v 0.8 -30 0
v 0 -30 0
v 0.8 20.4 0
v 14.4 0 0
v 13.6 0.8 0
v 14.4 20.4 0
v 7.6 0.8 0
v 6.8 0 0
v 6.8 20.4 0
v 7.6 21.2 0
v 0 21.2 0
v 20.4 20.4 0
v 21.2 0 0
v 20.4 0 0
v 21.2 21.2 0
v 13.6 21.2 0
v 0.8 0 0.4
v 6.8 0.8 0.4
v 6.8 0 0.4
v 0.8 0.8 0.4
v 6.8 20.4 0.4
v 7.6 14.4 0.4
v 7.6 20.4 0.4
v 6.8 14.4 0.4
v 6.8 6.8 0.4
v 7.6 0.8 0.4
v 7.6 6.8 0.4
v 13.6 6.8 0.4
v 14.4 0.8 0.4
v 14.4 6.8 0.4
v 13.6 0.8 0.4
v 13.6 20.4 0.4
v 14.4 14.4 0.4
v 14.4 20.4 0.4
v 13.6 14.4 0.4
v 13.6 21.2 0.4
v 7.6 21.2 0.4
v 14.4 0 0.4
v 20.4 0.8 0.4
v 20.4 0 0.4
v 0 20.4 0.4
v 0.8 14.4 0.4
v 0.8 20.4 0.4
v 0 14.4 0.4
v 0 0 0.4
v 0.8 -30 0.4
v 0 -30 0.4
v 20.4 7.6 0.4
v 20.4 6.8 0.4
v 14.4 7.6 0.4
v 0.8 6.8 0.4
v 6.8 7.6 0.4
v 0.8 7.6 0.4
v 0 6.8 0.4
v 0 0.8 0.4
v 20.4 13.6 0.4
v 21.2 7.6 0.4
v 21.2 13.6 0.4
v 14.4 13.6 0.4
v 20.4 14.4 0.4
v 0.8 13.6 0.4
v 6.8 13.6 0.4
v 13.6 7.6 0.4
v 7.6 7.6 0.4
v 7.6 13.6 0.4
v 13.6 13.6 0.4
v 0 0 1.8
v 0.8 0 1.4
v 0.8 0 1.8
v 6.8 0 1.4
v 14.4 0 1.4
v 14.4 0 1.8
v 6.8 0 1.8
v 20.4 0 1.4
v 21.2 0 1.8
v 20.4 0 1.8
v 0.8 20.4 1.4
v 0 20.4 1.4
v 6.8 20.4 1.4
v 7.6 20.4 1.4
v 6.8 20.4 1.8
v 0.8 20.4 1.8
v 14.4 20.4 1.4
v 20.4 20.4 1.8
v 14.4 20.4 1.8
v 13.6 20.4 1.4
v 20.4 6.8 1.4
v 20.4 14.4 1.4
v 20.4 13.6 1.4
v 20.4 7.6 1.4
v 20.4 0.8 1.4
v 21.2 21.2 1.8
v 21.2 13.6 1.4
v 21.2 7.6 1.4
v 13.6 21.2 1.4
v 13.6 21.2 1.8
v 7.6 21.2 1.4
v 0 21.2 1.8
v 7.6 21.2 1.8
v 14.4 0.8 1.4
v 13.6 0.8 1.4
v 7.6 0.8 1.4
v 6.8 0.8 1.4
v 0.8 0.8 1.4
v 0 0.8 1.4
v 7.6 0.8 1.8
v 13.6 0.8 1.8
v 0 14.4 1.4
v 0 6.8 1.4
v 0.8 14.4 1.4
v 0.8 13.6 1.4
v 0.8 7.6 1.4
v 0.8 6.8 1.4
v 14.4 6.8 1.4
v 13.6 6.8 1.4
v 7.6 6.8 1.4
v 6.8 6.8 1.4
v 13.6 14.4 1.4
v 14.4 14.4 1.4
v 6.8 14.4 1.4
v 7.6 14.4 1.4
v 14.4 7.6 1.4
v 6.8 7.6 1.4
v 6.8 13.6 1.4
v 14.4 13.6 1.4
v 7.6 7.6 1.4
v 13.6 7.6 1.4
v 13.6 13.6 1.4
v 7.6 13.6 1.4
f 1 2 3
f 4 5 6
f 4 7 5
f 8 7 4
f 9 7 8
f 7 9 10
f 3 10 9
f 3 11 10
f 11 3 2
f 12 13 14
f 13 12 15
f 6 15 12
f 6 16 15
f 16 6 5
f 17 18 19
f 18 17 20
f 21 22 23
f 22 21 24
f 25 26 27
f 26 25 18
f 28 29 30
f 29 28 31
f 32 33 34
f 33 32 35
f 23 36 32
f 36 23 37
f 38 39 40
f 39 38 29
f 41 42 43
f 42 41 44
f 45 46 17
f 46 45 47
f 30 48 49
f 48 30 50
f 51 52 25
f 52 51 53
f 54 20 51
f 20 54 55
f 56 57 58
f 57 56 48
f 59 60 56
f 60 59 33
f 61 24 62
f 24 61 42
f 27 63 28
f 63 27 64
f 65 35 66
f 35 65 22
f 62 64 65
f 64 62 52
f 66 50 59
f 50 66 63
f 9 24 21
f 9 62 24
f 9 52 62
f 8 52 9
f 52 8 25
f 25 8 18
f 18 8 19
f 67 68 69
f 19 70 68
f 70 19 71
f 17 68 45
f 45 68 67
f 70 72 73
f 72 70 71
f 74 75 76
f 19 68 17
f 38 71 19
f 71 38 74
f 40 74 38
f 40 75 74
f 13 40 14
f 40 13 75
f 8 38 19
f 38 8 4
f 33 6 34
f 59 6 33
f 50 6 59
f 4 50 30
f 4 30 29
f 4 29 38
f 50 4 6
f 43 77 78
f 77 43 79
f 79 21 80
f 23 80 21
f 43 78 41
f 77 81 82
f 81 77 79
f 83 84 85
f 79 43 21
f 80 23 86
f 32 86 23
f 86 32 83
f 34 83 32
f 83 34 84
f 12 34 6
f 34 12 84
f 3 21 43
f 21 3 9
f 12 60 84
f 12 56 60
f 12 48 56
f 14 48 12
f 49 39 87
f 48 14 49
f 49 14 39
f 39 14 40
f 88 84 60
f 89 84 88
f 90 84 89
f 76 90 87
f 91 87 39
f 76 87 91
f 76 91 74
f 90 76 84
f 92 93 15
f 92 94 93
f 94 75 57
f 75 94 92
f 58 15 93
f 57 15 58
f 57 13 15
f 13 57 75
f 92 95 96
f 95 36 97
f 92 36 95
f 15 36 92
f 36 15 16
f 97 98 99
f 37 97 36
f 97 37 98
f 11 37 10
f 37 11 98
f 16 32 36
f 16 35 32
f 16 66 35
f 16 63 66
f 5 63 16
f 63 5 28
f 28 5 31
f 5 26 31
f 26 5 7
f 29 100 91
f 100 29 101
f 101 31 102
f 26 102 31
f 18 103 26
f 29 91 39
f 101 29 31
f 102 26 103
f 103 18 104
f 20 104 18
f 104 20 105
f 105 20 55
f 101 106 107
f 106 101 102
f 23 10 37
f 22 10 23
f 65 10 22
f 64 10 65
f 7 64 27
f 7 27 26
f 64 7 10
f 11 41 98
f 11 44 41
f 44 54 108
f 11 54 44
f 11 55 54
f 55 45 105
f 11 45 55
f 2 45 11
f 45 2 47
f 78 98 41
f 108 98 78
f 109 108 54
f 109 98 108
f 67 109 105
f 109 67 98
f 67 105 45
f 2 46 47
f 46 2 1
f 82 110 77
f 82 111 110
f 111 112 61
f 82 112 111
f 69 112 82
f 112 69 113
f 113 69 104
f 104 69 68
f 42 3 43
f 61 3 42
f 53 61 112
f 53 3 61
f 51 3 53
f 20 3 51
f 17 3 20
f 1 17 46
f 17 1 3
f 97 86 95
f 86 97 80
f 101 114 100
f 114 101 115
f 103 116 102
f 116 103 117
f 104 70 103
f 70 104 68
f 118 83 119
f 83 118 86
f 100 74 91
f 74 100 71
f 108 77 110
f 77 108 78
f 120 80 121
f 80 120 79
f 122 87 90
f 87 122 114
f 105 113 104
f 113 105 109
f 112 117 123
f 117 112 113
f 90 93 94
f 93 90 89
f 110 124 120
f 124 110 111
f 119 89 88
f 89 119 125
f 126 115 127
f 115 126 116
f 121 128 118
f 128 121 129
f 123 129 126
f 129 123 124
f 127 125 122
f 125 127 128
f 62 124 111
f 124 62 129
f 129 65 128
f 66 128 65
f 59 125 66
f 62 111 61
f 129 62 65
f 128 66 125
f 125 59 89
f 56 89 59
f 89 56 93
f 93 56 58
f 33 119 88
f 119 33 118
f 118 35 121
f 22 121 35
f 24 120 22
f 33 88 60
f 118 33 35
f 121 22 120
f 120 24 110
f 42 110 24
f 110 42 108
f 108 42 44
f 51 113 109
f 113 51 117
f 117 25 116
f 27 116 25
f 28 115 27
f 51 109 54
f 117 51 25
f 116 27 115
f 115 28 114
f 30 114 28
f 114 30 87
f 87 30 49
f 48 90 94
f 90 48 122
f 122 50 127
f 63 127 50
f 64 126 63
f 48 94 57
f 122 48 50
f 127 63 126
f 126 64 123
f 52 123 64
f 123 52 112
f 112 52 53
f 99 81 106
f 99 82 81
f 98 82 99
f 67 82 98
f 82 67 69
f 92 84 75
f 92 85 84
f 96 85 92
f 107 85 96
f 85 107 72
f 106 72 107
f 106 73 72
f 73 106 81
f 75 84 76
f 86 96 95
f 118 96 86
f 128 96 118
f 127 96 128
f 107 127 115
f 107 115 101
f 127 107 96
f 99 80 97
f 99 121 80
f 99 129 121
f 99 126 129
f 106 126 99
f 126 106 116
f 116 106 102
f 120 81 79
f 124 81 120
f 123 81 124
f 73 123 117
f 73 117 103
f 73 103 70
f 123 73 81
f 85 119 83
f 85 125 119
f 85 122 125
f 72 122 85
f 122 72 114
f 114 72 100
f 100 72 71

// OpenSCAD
// file: ../../api/v3/reporting.scad
//////////////////////////////////////////////////////////////////////
// LibFile: reporting.scad
// Project: Grid Stack
// FileGroup: API v3 Reporting
// FileSummary: Console report for immutable direct and positive-gap coupons.
// Role: Records the exact environment, dimensions, support strategy, path
//       lengths, qualification status, and deposited-layer counts.
// Requires: API v3 indexes, mathematics, and path generator.
// Exports: report_structural_coupon_object().
//////////////////////////////////////////////////////////////////////

function _bridge_status3(span, process) =
    span <= process[PX3_BRIDGE_MAX]
        ? "within_owner_tested_limit"
        : "exploratory_beyond_owner_tested_limit";

module report_structural_coupon_object(object, report_level = "full") {
    material = object[SCO_MATERIAL];
    nozzle = object[SCO_NOZZLE];
    printer = object[SCO_PRINTER];
    process = object[SCO_PROCESS];
    boundary = object[SCO_BOUNDARY];
    gap = object[SCO_CLEAR_GAP];
    strategy = object[SCO_SUPPORT_STRATEGY];

    echo("--- Grid Stack immutable structural coupon ---");
    echo(str("Object: ", object[SCO_NAME], " revision ", object[SCO_REVISION]));
    echo(str("API/schema: ", object[SCO_REQUIRED_API], "/",
        object[SCO_SCHEMA_VERSION]));
    echo(str("Release/base commit: ", object[SCO_SOURCE_RELEASE], " / ",
        object[SCO_FRAMEWORK_BASE_COMMIT]));
    echo(str("Material/nozzle/printer: ", material[MAT3_FAMILY], " / ",
        nozzle[NZ3_DIAMETER], " mm / ", printer[PRN3_NAME]));
    echo(str("Cells: ", boundary[B3_CELLS_X], " x ", boundary[B3_CELLS_Y]));
    echo(str("Clear spans: ", boundary[B3_CLEAR_SPAN_X], " x ",
        boundary[B3_CLEAR_SPAN_Y], " mm"));
    echo(str("Span status: ",
        _bridge_status3(boundary[B3_CLEAR_SPAN_X], process)));
    echo(str("Outside size: ", boundary_size_x3(boundary, process, nozzle),
        " x ", boundary_size_y3(boundary, process, nozzle), " mm"));
    echo(str("Primitive trace: ", trace_width3(nozzle), " x ",
        trace_height3(process), " mm"));
    echo(str("Structural strand: ", strand_width3(process, nozzle), " x ",
        strand_height3(process), " mm"));
    echo(str("Clear vertical gap: ", gap, " mm"));
    echo(str("Support strategy: ", strategy));
    echo(str("Total modeled height: ", coupon_total_height3(object), " mm"));

    if (report_level == "full") {
        if (strategy == "direct_orthogonal") {
            lower = coupon_path(
                boundary, process, nozzle, 0, object[SCO_LEAD_IN]
            );
            upper = coupon_path(boundary, process, nozzle, 90, 0);
            echo(str("Lower/upper path lengths: ", path_length3(lower),
                " / ", path_length3(upper), " mm"));
            echo(str("Deposited layers: ", 2 * process[PX3_HEIGHT_PASSES]));
        }
        else {
            witness = coupon_path(
                boundary, process, nozzle, 90, object[SCO_LEAD_IN]
            );
            riser = coupon_path(boundary, process, nozzle, 0, 0);
            test = coupon_path(boundary, process, nozzle, 90, 0);
            echo(str("Witness/riser/test path lengths: ",
                path_length3(witness), " / ", path_length3(riser), " / ",
                path_length3(test), " mm"));
            echo(str("Riser deposited layers: ", round(gap_layer_count3(object))));
            echo(str("Total deposited layers: ",
                2 * process[PX3_HEIGHT_PASSES] +
                round(gap_layer_count3(object))));
        }
        echo(str("Status: ", object[SCO_STATUS]));
        echo(str("Notes: ", object[SCO_NOTES]));
    }
}
// file: ../../api/v3/validation.scad
//////////////////////////////////////////////////////////////////////
// LibFile: validation.scad
// Project: Grid Stack
// FileGroup: API v3 Validation
// FileSummary: Validates immutable environment records, count boundaries,
//              support strategy, path continuity, and layer quantization.
// Role: Rejects incompatible or physically floating recipes before geometry
//       is generated.
// Requires: API v3 indexes, mathematics, and path generator.
// Exports: validate_structural_coupon_object().
//////////////////////////////////////////////////////////////////////

module _validate_path3(points, boundary, orientation, lead_in) {
    run_count = orientation == 0
        ? boundary_strand_count_y3(boundary)
        : boundary_strand_count_x3(boundary);

    assert(len(points) == expected_coupon_point_count3(run_count, lead_in),
        "API v3 coupon path has an unexpected point count.");
    assert(!path_has_zero_segment3(points),
        "API v3 coupon path contains a zero-length segment.");
    assert(path_axis_aligned3(points),
        "API v3 coupon path must remain axis-aligned.");
    assert(points[0] != points[len(points) - 1],
        "API v3 coupon path must remain open.");
}

module validate_structural_coupon_object(object) {
    assert(object[SCO_REQUIRED_API] == GRID_STACK_API_VERSION,
        "Saved coupon requires a different Grid Stack API version.");
    assert(object[SCO_SCHEMA_VERSION] == GRID_STACK_COUPON_SCHEMA_VERSION,
        "Saved coupon requires a different coupon schema version.");
    assert(GRID_STACK_RECTANGULAR_FRAMEWORK_VERSION == 2,
        "Saved coupon requires rectangular framework version 2.");

    material = object[SCO_MATERIAL];
    nozzle = object[SCO_NOZZLE];
    printer = object[SCO_PRINTER];
    process = object[SCO_PROCESS];
    boundary = object[SCO_BOUNDARY];
    gap = object[SCO_CLEAR_GAP];
    lead_in = object[SCO_LEAD_IN];
    strategy = object[SCO_SUPPORT_STRATEGY];

    assert(nozzle[NZ3_DIAMETER] > 0,
        "Saved coupon nozzle diameter must be positive.");
    assert(process[PX3_LAYER_H] > 0,
        "Saved coupon layer height must be positive.");
    assert(process[PX3_WIDTH_PASSES] >= 2,
        "Saved coupon structural width requires at least two passes.");
    assert(process[PX3_HEIGHT_PASSES] >= 2,
        "Saved coupon structural height requires at least two layers.");
    assert(process[PX3_MATERIAL] == material[MAT3_NAME],
        "Saved coupon process/material references do not match.");
    assert(process[PX3_NOZZLE] == nozzle[NZ3_NAME],
        "Saved coupon process/nozzle references do not match.");
    assert(process[PX3_PRINTER] == printer[PRN3_NAME],
        "Saved coupon process/printer references do not match.");
    assert(boundary[B3_CELLS_X] > 0 && boundary[B3_CELLS_Y] > 0,
        "Saved coupon cell counts must be positive.");
    assert(boundary[B3_CLEAR_SPAN_X] > 0 &&
           boundary[B3_CLEAR_SPAN_Y] > 0,
        "Saved coupon clear spans must be positive.");
    assert(lead_in >= 0,
        "Saved coupon lead-in cannot be negative.");
    assert(gap >= 0,
        "Saved coupon clear gap cannot be negative.");
    assert(nearly_equal3(gap_layer_count3(object), round(gap_layer_count3(object))),
        "Saved coupon clear gap must equal a whole deposited-layer count.");
    assert(
        (strategy == "direct_orthogonal" && nearly_equal3(gap, 0)) ||
        (strategy == "witness_riser_bridge" && gap > 0),
        "Saved coupon support strategy does not match its clear gap."
    );

    if (strategy == "direct_orthogonal") {
        lower = coupon_path(boundary, process, nozzle, 0, lead_in);
        upper = coupon_path(boundary, process, nozzle, 90, 0);
        _validate_path3(lower, boundary, 0, lead_in);
        _validate_path3(upper, boundary, 90, 0);
        entry = lead_in > 0 ? 1 : 0;
        assert(nearly_equal3(point_distance_2d3(lower[entry], upper[0]), 0),
            "Direct upper path must start on the lower entry crossing.");
    }
    else {
        witness = coupon_path(boundary, process, nozzle, 90, lead_in);
        riser = coupon_path(boundary, process, nozzle, 0, 0);
        test = coupon_path(boundary, process, nozzle, 90, 0);
        _validate_path3(witness, boundary, 90, lead_in);
        _validate_path3(riser, boundary, 0, 0);
        _validate_path3(test, boundary, 90, 0);
        entry = lead_in > 0 ? 1 : 0;
        assert(nearly_equal3(point_distance_2d3(witness[entry], riser[0]), 0),
            "Riser path must start on the witness entry crossing.");
        assert(nearly_equal3(point_distance_2d3(riser[0], test[0]), 0),
            "Upper test path must start on the riser entry crossing.");
        for (i = [0 : len(test) - 1])
            assert(nearly_equal3(point_distance_2d3(test[i], witness[i + entry]), 0),
                "Upper test path must align directly above the witness path.");
    }

    echo("GRID STACK API V3 COUPON VALIDATION: PASS");
}
// file: ../../api/v3/geometry.scad
//////////////////////////////////////////////////////////////////////
// LibFile: geometry.scad
// Project: Grid Stack
// FileGroup: API v3 Printable Geometry
// FileSummary: Creates square-ended structural paths, direct-contact coupons,
//              positive witness/riser/bridge coupons, and simple diagnostics.
// Role: Supplies all geometry used by immutable API v3 recipes without
//       importing mutable workbench geometry.
// Requires: API v3 mathematics and ordered axis-aligned paths.
// Exports: render_direct_coupon(), render_positive_gap_coupon(), and
//          render_coupon_path_debug().
//////////////////////////////////////////////////////////////////////

module _segment_2d3(a, b, width) {
    horizontal = nearly_equal3(a[1], b[1]);
    vertical = nearly_equal3(a[0], b[0]);

    assert(horizontal || vertical,
        "API v3 printable segments must be horizontal or vertical.");
    assert(!nearly_equal3(point_distance_2d3(a, b), 0),
        "API v3 printable segments must have nonzero length.");

    if (horizontal)
        translate([min(a[0], b[0]) - width / 2, a[1] - width / 2])
            square([abs(b[0] - a[0]) + width, width]);
    else
        translate([a[0] - width / 2, min(a[1], b[1]) - width / 2])
            square([width, abs(b[1] - a[1]) + width]);
}

module _path_2d3(points, width) {
    union()
        for (i = [0 : len(points) - 2])
            _segment_2d3(points[i], points[i + 1], width);
}

module _structural_path3(points, process, nozzle) {
    linear_extrude(height = strand_height3(process), convexity = 10)
        _path_2d3(points, strand_width3(process, nozzle));
}

module render_direct_coupon(lower, upper, process, nozzle) {
    union() {
        _structural_path3(lower, process, nozzle);
        translate([0, 0, strand_height3(process)])
            _structural_path3(upper, process, nozzle);
    }
}

module render_positive_gap_coupon(
    witness, riser, test, process, nozzle, clear_gap
) {
    union() {
        _structural_path3(witness, process, nozzle);

        translate([0, 0, strand_height3(process)])
            linear_extrude(height = clear_gap, convexity = 10)
                _path_2d3(riser, strand_width3(process, nozzle));

        translate([0, 0, strand_height3(process) + clear_gap])
            _structural_path3(test, process, nozzle);
    }
}

module _debug_path3(points, z, width) {
    translate([0, 0, z])
        linear_extrude(height = 0.04)
            _path_2d3(points, width);
}

module render_coupon_path_debug(
    lower, upper, riser, process, clear_gap = 0
) {
    width = max(0.12, trace_height3(process));
    _debug_path3(lower, 0, width);
    if (len(riser) > 0)
        _debug_path3(riser, strand_height3(process), width);
    _debug_path3(
        upper,
        strand_height3(process) + clear_gap,
        width
    );
}
// file: ../../api/v3/paths.scad
//////////////////////////////////////////////////////////////////////
// LibFile: paths.scad
// Project: Grid Stack
// FileGroup: API v3 Path Generation
// FileSummary: Generates one open rectangular serpentine centerline from a
//              count boundary for X- or Y-running structural paths.
// Role: Preserves parallel runs, square connectors, optional single lead-in,
//       and one uninterrupted ordered point list per deposited layer.
// Requires: API v3 indexes and mathematics.
// Exports: coupon_path() and expected_coupon_point_count3().
//////////////////////////////////////////////////////////////////////

function _x_rows3(row, count, x_min, x_max, y_min, pitch) =
    row >= count
        ? []
        : let(
            y = y_min + row * pitch,
            x_end = row % 2 == 0 ? x_max : x_min,
            row_end = [x_end, y],
            connector_end = [x_end, y + pitch]
        )
        concat(
            [row_end],
            row < count - 1 ? [connector_end] : [],
            _x_rows3(row + 1, count, x_min, x_max, y_min, pitch)
        );

function _y_columns3(column, count, x_min, y_min, y_max, pitch) =
    column >= count
        ? []
        : let(
            x = x_min + column * pitch,
            y_end = column % 2 == 0 ? y_max : y_min,
            column_end = [x, y_end],
            connector_end = [x + pitch, y_end]
        )
        concat(
            [column_end],
            column < count - 1 ? [connector_end] : [],
            _y_columns3(column + 1, count, x_min, y_min, y_max, pitch)
        );

function expected_coupon_point_count3(run_count, lead_in = 0) =
    2 * run_count + (lead_in > 0 ? 1 : 0);

function coupon_path(
    boundary, process, nozzle, orientation = 0, lead_in = 0
) =
    assert(orientation == 0 || orientation == 90,
        "API v3 coupon orientation must be 0 or 90 degrees.")
    assert(lead_in >= 0,
        "API v3 coupon lead-in cannot be negative.")
    let(
        width = strand_width3(process, nozzle),
        x_min = width / 2,
        y_min = width / 2,
        x_max = boundary_size_x3(boundary, process, nozzle) - width / 2,
        y_max = boundary_size_y3(boundary, process, nozzle) - width / 2,
        entry = [x_min, y_min],
        prefix = lead_in > 0
            ? (orientation == 0
                ? [[x_min - lead_in, y_min], entry]
                : [[x_min, y_min - lead_in], entry])
            : [entry]
    )
    orientation == 0
        ? concat(
            prefix,
            _x_rows3(
                0, boundary_strand_count_y3(boundary),
                x_min, x_max, y_min,
                boundary_pitch_y3(boundary, process, nozzle)
            )
        )
        : concat(
            prefix,
            _y_columns3(
                0, boundary_strand_count_x3(boundary),
                x_min, y_min, y_max,
                boundary_pitch_x3(boundary, process, nozzle)
            )
        );
// file: ../../api/v3/math.scad
//////////////////////////////////////////////////////////////////////
// LibFile: math.scad
// Project: Grid Stack
// FileGroup: API v3 Mathematics
// FileSummary: Pure trace, strand, boundary, path, and layer-count helpers.
// Role: Keeps API v3 calculations isolated and reproducible without importing
//       mutable workbench mathematics.
// Requires: API v3 indexes.
// Exports: nearly_equal3(), trace/strand dimensions, boundary dimensions,
//          path inspection, gap-layer count, and total-height helpers.
//////////////////////////////////////////////////////////////////////

function nearly_equal3(a, b, epsilon = 0.000001) = abs(a - b) <= epsilon;

function trace_width3(nozzle) = nozzle[NZ3_DIAMETER];
function trace_height3(process) = process[PX3_LAYER_H];
function strand_width3(process, nozzle) =
    trace_width3(nozzle) * process[PX3_WIDTH_PASSES];
function strand_height3(process) =
    trace_height3(process) * process[PX3_HEIGHT_PASSES];

function boundary_strand_count_x3(boundary) = boundary[B3_CELLS_X] + 1;
function boundary_strand_count_y3(boundary) = boundary[B3_CELLS_Y] + 1;
function boundary_pitch_x3(boundary, process, nozzle) =
    boundary[B3_CLEAR_SPAN_X] + strand_width3(process, nozzle);
function boundary_pitch_y3(boundary, process, nozzle) =
    boundary[B3_CLEAR_SPAN_Y] + strand_width3(process, nozzle);
function boundary_size_x3(boundary, process, nozzle) =
    boundary[B3_CELLS_X] * boundary[B3_CLEAR_SPAN_X] +
    boundary_strand_count_x3(boundary) * strand_width3(process, nozzle);
function boundary_size_y3(boundary, process, nozzle) =
    boundary[B3_CELLS_Y] * boundary[B3_CLEAR_SPAN_Y] +
    boundary_strand_count_y3(boundary) * strand_width3(process, nozzle);

function point_distance_2d3(a, b) =
    sqrt(pow(b[0] - a[0], 2) + pow(b[1] - a[1], 2));
function path_length3(points, i = 0) =
    i >= len(points) - 1
        ? 0
        : point_distance_2d3(points[i], points[i + 1]) +
          path_length3(points, i + 1);
function path_has_zero_segment3(points, i = 0) =
    i >= len(points) - 1
        ? false
        : nearly_equal3(point_distance_2d3(points[i], points[i + 1]), 0)
            ? true
            : path_has_zero_segment3(points, i + 1);
function segment_axis_aligned3(a, b) =
    nearly_equal3(a[0], b[0]) || nearly_equal3(a[1], b[1]);
function path_axis_aligned3(points, i = 0) =
    i >= len(points) - 1
        ? true
        : segment_axis_aligned3(points[i], points[i + 1]) &&
          path_axis_aligned3(points, i + 1);

function gap_layer_count3(object) =
    object[SCO_CLEAR_GAP] / trace_height3(object[SCO_PROCESS]);
function coupon_total_height3(object) =
    2 * strand_height3(object[SCO_PROCESS]) + object[SCO_CLEAR_GAP];
// file: ../../api/v3/schema.scad
//////////////////////////////////////////////////////////////////////
// LibFile: schema.scad
// Project: Grid Stack
// FileGroup: API v3 Data Model
// FileSummary: Constructors for self-contained immutable structural coupons.
// Role: Makes every geometry-affecting environment and object value explicit
//       inside the saved recipe rather than resolving mutable catalog names.
// Exports: material_spec(), nozzle_spec(), printer_spec(),
//          structural_process_profile(), count_boundary(), and
//          structural_coupon_object().
//////////////////////////////////////////////////////////////////////

function material_spec(
    name, family, flexibility, status = "in_use", notes = ""
) = [name, family, flexibility, status, notes];

function nozzle_spec(
    name, diameter, construction = "brass", status = "in_use", notes = ""
) = [name, diameter, construction, status, notes];

function printer_spec(
    name,
    manufacturer = "",
    model = "",
    motion_system = "",
    build_surface = "",
    status = "unrecorded",
    notes = ""
) = [
    name, manufacturer, model, motion_system,
    build_surface, status, notes
];

function structural_process_profile(
    name,
    material_name,
    nozzle_name,
    printer_name,
    layer_height,
    width_passes,
    height_passes,
    bridge_max,
    qualification,
    revision,
    notes = ""
) = [
    name, material_name, nozzle_name, printer_name,
    layer_height, width_passes, height_passes, bridge_max,
    qualification, revision, notes
];

// Function: count_boundary()
// Synopsis: Stores clear-opening counts and clear spans for one rectangle.
function count_boundary(
    name,
    cells_x,
    cells_y,
    clear_span_x,
    clear_span_y,
    notes = ""
) = [name, cells_x, cells_y, clear_span_x, clear_span_y, notes];

// Function: structural_coupon_object()
// Synopsis: Constructs one permanent coupon recipe.
// Description:
//   framework_base_commit records the last accepted repository state used to
//   begin the API implementation. The Git commit containing this recipe is the
//   authoritative complete source; a file cannot embed its own future hash.
function structural_coupon_object(
    name,
    revision,
    required_api_version,
    coupon_schema_version,
    source_release,
    framework_base_commit,
    material,
    nozzle,
    printer,
    process,
    boundary,
    clear_vertical_gap,
    lead_in,
    support_strategy,
    status = "calibration",
    notes = ""
) = [
    name,
    revision,
    required_api_version,
    coupon_schema_version,
    source_release,
    framework_base_commit,
    material,
    nozzle,
    printer,
    process,
    boundary,
    clear_vertical_gap,
    lead_in,
    support_strategy,
    status,
    notes
];
// file: ../../api/v3/indices.scad
//////////////////////////////////////////////////////////////////////
// LibFile: indices.scad
// Project: Grid Stack
// FileGroup: API v3 Data Model
// FileSummary: Named indexes for immutable structural-coupon records.
// Role: Prevents unexplained numeric indexes from entering saved recipes and
//       keeps API version 3 independent of mutable workbench indexes.
// Exports: MAT3_*, NZ3_*, PRN3_*, PX3_*, B3_*, and SCO_* constants.
//////////////////////////////////////////////////////////////////////

MAT3_NAME = 0;
MAT3_FAMILY = 1;
MAT3_FLEXIBILITY = 2;
MAT3_STATUS = 3;
MAT3_NOTES = 4;

NZ3_NAME = 0;
NZ3_DIAMETER = 1;
NZ3_CONSTRUCTION = 2;
NZ3_STATUS = 3;
NZ3_NOTES = 4;

PRN3_NAME = 0;
PRN3_MANUFACTURER = 1;
PRN3_MODEL = 2;
PRN3_MOTION_SYSTEM = 3;
PRN3_BUILD_SURFACE = 4;
PRN3_STATUS = 5;
PRN3_NOTES = 6;

PX3_NAME = 0;
PX3_MATERIAL = 1;
PX3_NOZZLE = 2;
PX3_PRINTER = 3;
PX3_LAYER_H = 4;
PX3_WIDTH_PASSES = 5;
PX3_HEIGHT_PASSES = 6;
PX3_BRIDGE_MAX = 7;
PX3_QUALIFICATION = 8;
PX3_REVISION = 9;
PX3_NOTES = 10;

B3_NAME = 0;
B3_CELLS_X = 1;
B3_CELLS_Y = 2;
B3_CLEAR_SPAN_X = 3;
B3_CLEAR_SPAN_Y = 4;
B3_NOTES = 5;

SCO_NAME = 0;
SCO_REVISION = 1;
SCO_REQUIRED_API = 2;
SCO_SCHEMA_VERSION = 3;
SCO_SOURCE_RELEASE = 4;
SCO_FRAMEWORK_BASE_COMMIT = 5;
SCO_MATERIAL = 6;
SCO_NOZZLE = 7;
SCO_PRINTER = 8;
SCO_PROCESS = 9;
SCO_BOUNDARY = 10;
SCO_CLEAR_GAP = 11;
SCO_LEAD_IN = 12;
SCO_SUPPORT_STRATEGY = 13;
SCO_STATUS = 14;
SCO_NOTES = 15;
// file: ../../api/grid_stack_v3.scad
//////////////////////////////////////////////////////////////////////
// LibFile: grid_stack_v3.scad
// Project: Grid Stack
// FileGroup: Versioned Public Interface
// FileSummary: Immutable API version 3 for rectangular count-boundary
//              structural coupons, including positive witness/riser gaps.
// Role: Reconstructs saved coupon recipes without Customizer state or mutable
//       workbench catalogs. Incompatible behavior requires a new API file.
// Exports: API/schema constants, record constructors, validation, reporting,
//          and structural_coupon_render().
//////////////////////////////////////////////////////////////////////

GRID_STACK_API_VERSION = 3;
GRID_STACK_COUPON_SCHEMA_VERSION = 1;
GRID_STACK_RECTANGULAR_FRAMEWORK_VERSION = 2;
GRID_STACK_RELEASE = "1.0.0";

include <v3/indices.scad>
include <v3/schema.scad>
include <v3/math.scad>
include <v3/paths.scad>
include <v3/geometry.scad>
include <v3/validation.scad>
include <v3/reporting.scad>

// Module: structural_coupon_render()
// Synopsis: Validates, reports, and renders one immutable coupon recipe.
// Arguments:
//   object = Record returned by structural_coupon_object().
//   mode = print, path_debug, or report_only.
//   report_level = summary or full.
module structural_coupon_render(
    object,
    mode = "print",
    report_level = "full"
) {
    validate_structural_coupon_object(object);
    report_structural_coupon_object(object, report_level);

    boundary = object[SCO_BOUNDARY];
    process = object[SCO_PROCESS];
    nozzle = object[SCO_NOZZLE];
    lead_in = object[SCO_LEAD_IN];
    clear_gap = object[SCO_CLEAR_GAP];
    strategy = object[SCO_SUPPORT_STRATEGY];

    if (strategy == "direct_orthogonal") {
        lower = coupon_path(boundary, process, nozzle, 0, lead_in);
        upper = coupon_path(boundary, process, nozzle, 90, 0);

        if (mode == "print")
            render_direct_coupon(lower, upper, process, nozzle);
        else if (mode == "path_debug")
            render_coupon_path_debug(lower, upper, [], process);
        else if (mode == "report_only")
            echo("Grid Stack API v3 report-only mode: no geometry generated.");
        else
            assert(false, str("Unknown API v3 render mode: ", mode));
    }
    else if (strategy == "witness_riser_bridge") {
        witness = coupon_path(boundary, process, nozzle, 90, lead_in);
        riser = coupon_path(boundary, process, nozzle, 0, 0);
        test = coupon_path(boundary, process, nozzle, 90, 0);

        if (mode == "print")
            render_positive_gap_coupon(
                witness, riser, test, process, nozzle, clear_gap
            );
        else if (mode == "path_debug")
            render_coupon_path_debug(witness, test, riser, process, clear_gap);
        else if (mode == "report_only")
            echo("Grid Stack API v3 report-only mode: no geometry generated.");
        else
            assert(false, str("Unknown API v3 render mode: ", mode));
    }
    else
        assert(false, str("Unknown coupon support strategy: ", strategy));
}
// main file
//////////////////////////////////////////////////////////////////////
// LibFile: coupon-3x3-span6-gap1-pla-plus-0p4-v1.scad
// Project: Grid Stack
// FileGroup: Immutable Structural Coupon
// FileSummary: 3 x 3 PLA+ coupon with 6 mm clear XY spans and 1 mm
//              clear vertical gap using witness_riser_bridge geometry.
// Role: Permanently reconstructs one calibration object without Customizer
//       state or mutable workbench catalog lookup.
// FrameworkBaseCommit: 4b5e564
// Requires: Grid Stack API version 3 and coupon schema version 1.
// Output: Printable continuous-path structural coupon geometry.
//////////////////////////////////////////////////////////////////////

include <../../api/grid_stack_v3.scad>

assert(GRID_STACK_API_VERSION == 3,
    "This recipe requires Grid Stack API version 3.");
assert(GRID_STACK_COUPON_SCHEMA_VERSION == 1,
    "This recipe requires coupon schema version 1.");
assert(GRID_STACK_RECTANGULAR_FRAMEWORK_VERSION == 2,
    "This recipe requires rectangular framework version 2.");

saved_material = material_spec(
    name = "PLA_PLUS",
    family = "PLA+",
    flexibility = "rigid",
    status = "in_use",
    notes = "Exact material family selected for the coupon matrix."
);

saved_nozzle = nozzle_spec(
    name = "BRASS_0P4",
    diameter = 0.4,
    construction = "brass",
    status = "in_use",
    notes = "Nominal nozzle diameter used to derive the 0.8 mm strand width."
);

saved_printer = printer_spec(
    name = "UNRECORDED_PRINTER_R1",
    manufacturer = "",
    model = "",
    motion_system = "",
    build_surface = "",
    status = "unrecorded",
    notes = "Printer identity was not frozen with this coupon framework."
);

saved_process = structural_process_profile(
    name = "PLA_PLUS_0P4_LH0P2_W2_H2_R1",
    material_name = "PLA_PLUS",
    nozzle_name = "BRASS_0P4",
    printer_name = "UNRECORDED_PRINTER_R1",
    layer_height = 0.2,
    width_passes = 2,
    height_passes = 2,
    bridge_max = 6,
    qualification = "owner_tested_to_6mm",
    revision = 1,
    notes = "Primitive trace 0.4 x 0.2 mm; structural strand 0.8 x 0.4 mm."
);

saved_boundary = count_boundary(
    name = "COUNT_3X3_SPAN6",
    cells_x = 3,
    cells_y = 3,
    clear_span_x = 6,
    clear_span_y = 6,
    notes = "Outside dimensions derive from four strands and three clear openings."
);

saved_coupon = structural_coupon_object(
    name = "COUPON_3X3_SPAN6_GAP1_PLA_PLUS_0P4_V1",
    revision = 1,
    required_api_version = 3,
    coupon_schema_version = 1,
    source_release = "1.0.0",
    framework_base_commit = "4b5e564",
    material = saved_material,
    nozzle = saved_nozzle,
    printer = saved_printer,
    process = saved_process,
    boundary = saved_boundary,
    clear_vertical_gap = 1,
    lead_in = 30,
    support_strategy = "witness_riser_bridge",
    status = "calibration_unprinted",
    notes = "Calibration recipe generated from the frozen Batch 010 framework; record results in a new revision after printing."
);

structural_coupon_render(
    saved_coupon,
    mode = "print",
    report_level = "full"
);
